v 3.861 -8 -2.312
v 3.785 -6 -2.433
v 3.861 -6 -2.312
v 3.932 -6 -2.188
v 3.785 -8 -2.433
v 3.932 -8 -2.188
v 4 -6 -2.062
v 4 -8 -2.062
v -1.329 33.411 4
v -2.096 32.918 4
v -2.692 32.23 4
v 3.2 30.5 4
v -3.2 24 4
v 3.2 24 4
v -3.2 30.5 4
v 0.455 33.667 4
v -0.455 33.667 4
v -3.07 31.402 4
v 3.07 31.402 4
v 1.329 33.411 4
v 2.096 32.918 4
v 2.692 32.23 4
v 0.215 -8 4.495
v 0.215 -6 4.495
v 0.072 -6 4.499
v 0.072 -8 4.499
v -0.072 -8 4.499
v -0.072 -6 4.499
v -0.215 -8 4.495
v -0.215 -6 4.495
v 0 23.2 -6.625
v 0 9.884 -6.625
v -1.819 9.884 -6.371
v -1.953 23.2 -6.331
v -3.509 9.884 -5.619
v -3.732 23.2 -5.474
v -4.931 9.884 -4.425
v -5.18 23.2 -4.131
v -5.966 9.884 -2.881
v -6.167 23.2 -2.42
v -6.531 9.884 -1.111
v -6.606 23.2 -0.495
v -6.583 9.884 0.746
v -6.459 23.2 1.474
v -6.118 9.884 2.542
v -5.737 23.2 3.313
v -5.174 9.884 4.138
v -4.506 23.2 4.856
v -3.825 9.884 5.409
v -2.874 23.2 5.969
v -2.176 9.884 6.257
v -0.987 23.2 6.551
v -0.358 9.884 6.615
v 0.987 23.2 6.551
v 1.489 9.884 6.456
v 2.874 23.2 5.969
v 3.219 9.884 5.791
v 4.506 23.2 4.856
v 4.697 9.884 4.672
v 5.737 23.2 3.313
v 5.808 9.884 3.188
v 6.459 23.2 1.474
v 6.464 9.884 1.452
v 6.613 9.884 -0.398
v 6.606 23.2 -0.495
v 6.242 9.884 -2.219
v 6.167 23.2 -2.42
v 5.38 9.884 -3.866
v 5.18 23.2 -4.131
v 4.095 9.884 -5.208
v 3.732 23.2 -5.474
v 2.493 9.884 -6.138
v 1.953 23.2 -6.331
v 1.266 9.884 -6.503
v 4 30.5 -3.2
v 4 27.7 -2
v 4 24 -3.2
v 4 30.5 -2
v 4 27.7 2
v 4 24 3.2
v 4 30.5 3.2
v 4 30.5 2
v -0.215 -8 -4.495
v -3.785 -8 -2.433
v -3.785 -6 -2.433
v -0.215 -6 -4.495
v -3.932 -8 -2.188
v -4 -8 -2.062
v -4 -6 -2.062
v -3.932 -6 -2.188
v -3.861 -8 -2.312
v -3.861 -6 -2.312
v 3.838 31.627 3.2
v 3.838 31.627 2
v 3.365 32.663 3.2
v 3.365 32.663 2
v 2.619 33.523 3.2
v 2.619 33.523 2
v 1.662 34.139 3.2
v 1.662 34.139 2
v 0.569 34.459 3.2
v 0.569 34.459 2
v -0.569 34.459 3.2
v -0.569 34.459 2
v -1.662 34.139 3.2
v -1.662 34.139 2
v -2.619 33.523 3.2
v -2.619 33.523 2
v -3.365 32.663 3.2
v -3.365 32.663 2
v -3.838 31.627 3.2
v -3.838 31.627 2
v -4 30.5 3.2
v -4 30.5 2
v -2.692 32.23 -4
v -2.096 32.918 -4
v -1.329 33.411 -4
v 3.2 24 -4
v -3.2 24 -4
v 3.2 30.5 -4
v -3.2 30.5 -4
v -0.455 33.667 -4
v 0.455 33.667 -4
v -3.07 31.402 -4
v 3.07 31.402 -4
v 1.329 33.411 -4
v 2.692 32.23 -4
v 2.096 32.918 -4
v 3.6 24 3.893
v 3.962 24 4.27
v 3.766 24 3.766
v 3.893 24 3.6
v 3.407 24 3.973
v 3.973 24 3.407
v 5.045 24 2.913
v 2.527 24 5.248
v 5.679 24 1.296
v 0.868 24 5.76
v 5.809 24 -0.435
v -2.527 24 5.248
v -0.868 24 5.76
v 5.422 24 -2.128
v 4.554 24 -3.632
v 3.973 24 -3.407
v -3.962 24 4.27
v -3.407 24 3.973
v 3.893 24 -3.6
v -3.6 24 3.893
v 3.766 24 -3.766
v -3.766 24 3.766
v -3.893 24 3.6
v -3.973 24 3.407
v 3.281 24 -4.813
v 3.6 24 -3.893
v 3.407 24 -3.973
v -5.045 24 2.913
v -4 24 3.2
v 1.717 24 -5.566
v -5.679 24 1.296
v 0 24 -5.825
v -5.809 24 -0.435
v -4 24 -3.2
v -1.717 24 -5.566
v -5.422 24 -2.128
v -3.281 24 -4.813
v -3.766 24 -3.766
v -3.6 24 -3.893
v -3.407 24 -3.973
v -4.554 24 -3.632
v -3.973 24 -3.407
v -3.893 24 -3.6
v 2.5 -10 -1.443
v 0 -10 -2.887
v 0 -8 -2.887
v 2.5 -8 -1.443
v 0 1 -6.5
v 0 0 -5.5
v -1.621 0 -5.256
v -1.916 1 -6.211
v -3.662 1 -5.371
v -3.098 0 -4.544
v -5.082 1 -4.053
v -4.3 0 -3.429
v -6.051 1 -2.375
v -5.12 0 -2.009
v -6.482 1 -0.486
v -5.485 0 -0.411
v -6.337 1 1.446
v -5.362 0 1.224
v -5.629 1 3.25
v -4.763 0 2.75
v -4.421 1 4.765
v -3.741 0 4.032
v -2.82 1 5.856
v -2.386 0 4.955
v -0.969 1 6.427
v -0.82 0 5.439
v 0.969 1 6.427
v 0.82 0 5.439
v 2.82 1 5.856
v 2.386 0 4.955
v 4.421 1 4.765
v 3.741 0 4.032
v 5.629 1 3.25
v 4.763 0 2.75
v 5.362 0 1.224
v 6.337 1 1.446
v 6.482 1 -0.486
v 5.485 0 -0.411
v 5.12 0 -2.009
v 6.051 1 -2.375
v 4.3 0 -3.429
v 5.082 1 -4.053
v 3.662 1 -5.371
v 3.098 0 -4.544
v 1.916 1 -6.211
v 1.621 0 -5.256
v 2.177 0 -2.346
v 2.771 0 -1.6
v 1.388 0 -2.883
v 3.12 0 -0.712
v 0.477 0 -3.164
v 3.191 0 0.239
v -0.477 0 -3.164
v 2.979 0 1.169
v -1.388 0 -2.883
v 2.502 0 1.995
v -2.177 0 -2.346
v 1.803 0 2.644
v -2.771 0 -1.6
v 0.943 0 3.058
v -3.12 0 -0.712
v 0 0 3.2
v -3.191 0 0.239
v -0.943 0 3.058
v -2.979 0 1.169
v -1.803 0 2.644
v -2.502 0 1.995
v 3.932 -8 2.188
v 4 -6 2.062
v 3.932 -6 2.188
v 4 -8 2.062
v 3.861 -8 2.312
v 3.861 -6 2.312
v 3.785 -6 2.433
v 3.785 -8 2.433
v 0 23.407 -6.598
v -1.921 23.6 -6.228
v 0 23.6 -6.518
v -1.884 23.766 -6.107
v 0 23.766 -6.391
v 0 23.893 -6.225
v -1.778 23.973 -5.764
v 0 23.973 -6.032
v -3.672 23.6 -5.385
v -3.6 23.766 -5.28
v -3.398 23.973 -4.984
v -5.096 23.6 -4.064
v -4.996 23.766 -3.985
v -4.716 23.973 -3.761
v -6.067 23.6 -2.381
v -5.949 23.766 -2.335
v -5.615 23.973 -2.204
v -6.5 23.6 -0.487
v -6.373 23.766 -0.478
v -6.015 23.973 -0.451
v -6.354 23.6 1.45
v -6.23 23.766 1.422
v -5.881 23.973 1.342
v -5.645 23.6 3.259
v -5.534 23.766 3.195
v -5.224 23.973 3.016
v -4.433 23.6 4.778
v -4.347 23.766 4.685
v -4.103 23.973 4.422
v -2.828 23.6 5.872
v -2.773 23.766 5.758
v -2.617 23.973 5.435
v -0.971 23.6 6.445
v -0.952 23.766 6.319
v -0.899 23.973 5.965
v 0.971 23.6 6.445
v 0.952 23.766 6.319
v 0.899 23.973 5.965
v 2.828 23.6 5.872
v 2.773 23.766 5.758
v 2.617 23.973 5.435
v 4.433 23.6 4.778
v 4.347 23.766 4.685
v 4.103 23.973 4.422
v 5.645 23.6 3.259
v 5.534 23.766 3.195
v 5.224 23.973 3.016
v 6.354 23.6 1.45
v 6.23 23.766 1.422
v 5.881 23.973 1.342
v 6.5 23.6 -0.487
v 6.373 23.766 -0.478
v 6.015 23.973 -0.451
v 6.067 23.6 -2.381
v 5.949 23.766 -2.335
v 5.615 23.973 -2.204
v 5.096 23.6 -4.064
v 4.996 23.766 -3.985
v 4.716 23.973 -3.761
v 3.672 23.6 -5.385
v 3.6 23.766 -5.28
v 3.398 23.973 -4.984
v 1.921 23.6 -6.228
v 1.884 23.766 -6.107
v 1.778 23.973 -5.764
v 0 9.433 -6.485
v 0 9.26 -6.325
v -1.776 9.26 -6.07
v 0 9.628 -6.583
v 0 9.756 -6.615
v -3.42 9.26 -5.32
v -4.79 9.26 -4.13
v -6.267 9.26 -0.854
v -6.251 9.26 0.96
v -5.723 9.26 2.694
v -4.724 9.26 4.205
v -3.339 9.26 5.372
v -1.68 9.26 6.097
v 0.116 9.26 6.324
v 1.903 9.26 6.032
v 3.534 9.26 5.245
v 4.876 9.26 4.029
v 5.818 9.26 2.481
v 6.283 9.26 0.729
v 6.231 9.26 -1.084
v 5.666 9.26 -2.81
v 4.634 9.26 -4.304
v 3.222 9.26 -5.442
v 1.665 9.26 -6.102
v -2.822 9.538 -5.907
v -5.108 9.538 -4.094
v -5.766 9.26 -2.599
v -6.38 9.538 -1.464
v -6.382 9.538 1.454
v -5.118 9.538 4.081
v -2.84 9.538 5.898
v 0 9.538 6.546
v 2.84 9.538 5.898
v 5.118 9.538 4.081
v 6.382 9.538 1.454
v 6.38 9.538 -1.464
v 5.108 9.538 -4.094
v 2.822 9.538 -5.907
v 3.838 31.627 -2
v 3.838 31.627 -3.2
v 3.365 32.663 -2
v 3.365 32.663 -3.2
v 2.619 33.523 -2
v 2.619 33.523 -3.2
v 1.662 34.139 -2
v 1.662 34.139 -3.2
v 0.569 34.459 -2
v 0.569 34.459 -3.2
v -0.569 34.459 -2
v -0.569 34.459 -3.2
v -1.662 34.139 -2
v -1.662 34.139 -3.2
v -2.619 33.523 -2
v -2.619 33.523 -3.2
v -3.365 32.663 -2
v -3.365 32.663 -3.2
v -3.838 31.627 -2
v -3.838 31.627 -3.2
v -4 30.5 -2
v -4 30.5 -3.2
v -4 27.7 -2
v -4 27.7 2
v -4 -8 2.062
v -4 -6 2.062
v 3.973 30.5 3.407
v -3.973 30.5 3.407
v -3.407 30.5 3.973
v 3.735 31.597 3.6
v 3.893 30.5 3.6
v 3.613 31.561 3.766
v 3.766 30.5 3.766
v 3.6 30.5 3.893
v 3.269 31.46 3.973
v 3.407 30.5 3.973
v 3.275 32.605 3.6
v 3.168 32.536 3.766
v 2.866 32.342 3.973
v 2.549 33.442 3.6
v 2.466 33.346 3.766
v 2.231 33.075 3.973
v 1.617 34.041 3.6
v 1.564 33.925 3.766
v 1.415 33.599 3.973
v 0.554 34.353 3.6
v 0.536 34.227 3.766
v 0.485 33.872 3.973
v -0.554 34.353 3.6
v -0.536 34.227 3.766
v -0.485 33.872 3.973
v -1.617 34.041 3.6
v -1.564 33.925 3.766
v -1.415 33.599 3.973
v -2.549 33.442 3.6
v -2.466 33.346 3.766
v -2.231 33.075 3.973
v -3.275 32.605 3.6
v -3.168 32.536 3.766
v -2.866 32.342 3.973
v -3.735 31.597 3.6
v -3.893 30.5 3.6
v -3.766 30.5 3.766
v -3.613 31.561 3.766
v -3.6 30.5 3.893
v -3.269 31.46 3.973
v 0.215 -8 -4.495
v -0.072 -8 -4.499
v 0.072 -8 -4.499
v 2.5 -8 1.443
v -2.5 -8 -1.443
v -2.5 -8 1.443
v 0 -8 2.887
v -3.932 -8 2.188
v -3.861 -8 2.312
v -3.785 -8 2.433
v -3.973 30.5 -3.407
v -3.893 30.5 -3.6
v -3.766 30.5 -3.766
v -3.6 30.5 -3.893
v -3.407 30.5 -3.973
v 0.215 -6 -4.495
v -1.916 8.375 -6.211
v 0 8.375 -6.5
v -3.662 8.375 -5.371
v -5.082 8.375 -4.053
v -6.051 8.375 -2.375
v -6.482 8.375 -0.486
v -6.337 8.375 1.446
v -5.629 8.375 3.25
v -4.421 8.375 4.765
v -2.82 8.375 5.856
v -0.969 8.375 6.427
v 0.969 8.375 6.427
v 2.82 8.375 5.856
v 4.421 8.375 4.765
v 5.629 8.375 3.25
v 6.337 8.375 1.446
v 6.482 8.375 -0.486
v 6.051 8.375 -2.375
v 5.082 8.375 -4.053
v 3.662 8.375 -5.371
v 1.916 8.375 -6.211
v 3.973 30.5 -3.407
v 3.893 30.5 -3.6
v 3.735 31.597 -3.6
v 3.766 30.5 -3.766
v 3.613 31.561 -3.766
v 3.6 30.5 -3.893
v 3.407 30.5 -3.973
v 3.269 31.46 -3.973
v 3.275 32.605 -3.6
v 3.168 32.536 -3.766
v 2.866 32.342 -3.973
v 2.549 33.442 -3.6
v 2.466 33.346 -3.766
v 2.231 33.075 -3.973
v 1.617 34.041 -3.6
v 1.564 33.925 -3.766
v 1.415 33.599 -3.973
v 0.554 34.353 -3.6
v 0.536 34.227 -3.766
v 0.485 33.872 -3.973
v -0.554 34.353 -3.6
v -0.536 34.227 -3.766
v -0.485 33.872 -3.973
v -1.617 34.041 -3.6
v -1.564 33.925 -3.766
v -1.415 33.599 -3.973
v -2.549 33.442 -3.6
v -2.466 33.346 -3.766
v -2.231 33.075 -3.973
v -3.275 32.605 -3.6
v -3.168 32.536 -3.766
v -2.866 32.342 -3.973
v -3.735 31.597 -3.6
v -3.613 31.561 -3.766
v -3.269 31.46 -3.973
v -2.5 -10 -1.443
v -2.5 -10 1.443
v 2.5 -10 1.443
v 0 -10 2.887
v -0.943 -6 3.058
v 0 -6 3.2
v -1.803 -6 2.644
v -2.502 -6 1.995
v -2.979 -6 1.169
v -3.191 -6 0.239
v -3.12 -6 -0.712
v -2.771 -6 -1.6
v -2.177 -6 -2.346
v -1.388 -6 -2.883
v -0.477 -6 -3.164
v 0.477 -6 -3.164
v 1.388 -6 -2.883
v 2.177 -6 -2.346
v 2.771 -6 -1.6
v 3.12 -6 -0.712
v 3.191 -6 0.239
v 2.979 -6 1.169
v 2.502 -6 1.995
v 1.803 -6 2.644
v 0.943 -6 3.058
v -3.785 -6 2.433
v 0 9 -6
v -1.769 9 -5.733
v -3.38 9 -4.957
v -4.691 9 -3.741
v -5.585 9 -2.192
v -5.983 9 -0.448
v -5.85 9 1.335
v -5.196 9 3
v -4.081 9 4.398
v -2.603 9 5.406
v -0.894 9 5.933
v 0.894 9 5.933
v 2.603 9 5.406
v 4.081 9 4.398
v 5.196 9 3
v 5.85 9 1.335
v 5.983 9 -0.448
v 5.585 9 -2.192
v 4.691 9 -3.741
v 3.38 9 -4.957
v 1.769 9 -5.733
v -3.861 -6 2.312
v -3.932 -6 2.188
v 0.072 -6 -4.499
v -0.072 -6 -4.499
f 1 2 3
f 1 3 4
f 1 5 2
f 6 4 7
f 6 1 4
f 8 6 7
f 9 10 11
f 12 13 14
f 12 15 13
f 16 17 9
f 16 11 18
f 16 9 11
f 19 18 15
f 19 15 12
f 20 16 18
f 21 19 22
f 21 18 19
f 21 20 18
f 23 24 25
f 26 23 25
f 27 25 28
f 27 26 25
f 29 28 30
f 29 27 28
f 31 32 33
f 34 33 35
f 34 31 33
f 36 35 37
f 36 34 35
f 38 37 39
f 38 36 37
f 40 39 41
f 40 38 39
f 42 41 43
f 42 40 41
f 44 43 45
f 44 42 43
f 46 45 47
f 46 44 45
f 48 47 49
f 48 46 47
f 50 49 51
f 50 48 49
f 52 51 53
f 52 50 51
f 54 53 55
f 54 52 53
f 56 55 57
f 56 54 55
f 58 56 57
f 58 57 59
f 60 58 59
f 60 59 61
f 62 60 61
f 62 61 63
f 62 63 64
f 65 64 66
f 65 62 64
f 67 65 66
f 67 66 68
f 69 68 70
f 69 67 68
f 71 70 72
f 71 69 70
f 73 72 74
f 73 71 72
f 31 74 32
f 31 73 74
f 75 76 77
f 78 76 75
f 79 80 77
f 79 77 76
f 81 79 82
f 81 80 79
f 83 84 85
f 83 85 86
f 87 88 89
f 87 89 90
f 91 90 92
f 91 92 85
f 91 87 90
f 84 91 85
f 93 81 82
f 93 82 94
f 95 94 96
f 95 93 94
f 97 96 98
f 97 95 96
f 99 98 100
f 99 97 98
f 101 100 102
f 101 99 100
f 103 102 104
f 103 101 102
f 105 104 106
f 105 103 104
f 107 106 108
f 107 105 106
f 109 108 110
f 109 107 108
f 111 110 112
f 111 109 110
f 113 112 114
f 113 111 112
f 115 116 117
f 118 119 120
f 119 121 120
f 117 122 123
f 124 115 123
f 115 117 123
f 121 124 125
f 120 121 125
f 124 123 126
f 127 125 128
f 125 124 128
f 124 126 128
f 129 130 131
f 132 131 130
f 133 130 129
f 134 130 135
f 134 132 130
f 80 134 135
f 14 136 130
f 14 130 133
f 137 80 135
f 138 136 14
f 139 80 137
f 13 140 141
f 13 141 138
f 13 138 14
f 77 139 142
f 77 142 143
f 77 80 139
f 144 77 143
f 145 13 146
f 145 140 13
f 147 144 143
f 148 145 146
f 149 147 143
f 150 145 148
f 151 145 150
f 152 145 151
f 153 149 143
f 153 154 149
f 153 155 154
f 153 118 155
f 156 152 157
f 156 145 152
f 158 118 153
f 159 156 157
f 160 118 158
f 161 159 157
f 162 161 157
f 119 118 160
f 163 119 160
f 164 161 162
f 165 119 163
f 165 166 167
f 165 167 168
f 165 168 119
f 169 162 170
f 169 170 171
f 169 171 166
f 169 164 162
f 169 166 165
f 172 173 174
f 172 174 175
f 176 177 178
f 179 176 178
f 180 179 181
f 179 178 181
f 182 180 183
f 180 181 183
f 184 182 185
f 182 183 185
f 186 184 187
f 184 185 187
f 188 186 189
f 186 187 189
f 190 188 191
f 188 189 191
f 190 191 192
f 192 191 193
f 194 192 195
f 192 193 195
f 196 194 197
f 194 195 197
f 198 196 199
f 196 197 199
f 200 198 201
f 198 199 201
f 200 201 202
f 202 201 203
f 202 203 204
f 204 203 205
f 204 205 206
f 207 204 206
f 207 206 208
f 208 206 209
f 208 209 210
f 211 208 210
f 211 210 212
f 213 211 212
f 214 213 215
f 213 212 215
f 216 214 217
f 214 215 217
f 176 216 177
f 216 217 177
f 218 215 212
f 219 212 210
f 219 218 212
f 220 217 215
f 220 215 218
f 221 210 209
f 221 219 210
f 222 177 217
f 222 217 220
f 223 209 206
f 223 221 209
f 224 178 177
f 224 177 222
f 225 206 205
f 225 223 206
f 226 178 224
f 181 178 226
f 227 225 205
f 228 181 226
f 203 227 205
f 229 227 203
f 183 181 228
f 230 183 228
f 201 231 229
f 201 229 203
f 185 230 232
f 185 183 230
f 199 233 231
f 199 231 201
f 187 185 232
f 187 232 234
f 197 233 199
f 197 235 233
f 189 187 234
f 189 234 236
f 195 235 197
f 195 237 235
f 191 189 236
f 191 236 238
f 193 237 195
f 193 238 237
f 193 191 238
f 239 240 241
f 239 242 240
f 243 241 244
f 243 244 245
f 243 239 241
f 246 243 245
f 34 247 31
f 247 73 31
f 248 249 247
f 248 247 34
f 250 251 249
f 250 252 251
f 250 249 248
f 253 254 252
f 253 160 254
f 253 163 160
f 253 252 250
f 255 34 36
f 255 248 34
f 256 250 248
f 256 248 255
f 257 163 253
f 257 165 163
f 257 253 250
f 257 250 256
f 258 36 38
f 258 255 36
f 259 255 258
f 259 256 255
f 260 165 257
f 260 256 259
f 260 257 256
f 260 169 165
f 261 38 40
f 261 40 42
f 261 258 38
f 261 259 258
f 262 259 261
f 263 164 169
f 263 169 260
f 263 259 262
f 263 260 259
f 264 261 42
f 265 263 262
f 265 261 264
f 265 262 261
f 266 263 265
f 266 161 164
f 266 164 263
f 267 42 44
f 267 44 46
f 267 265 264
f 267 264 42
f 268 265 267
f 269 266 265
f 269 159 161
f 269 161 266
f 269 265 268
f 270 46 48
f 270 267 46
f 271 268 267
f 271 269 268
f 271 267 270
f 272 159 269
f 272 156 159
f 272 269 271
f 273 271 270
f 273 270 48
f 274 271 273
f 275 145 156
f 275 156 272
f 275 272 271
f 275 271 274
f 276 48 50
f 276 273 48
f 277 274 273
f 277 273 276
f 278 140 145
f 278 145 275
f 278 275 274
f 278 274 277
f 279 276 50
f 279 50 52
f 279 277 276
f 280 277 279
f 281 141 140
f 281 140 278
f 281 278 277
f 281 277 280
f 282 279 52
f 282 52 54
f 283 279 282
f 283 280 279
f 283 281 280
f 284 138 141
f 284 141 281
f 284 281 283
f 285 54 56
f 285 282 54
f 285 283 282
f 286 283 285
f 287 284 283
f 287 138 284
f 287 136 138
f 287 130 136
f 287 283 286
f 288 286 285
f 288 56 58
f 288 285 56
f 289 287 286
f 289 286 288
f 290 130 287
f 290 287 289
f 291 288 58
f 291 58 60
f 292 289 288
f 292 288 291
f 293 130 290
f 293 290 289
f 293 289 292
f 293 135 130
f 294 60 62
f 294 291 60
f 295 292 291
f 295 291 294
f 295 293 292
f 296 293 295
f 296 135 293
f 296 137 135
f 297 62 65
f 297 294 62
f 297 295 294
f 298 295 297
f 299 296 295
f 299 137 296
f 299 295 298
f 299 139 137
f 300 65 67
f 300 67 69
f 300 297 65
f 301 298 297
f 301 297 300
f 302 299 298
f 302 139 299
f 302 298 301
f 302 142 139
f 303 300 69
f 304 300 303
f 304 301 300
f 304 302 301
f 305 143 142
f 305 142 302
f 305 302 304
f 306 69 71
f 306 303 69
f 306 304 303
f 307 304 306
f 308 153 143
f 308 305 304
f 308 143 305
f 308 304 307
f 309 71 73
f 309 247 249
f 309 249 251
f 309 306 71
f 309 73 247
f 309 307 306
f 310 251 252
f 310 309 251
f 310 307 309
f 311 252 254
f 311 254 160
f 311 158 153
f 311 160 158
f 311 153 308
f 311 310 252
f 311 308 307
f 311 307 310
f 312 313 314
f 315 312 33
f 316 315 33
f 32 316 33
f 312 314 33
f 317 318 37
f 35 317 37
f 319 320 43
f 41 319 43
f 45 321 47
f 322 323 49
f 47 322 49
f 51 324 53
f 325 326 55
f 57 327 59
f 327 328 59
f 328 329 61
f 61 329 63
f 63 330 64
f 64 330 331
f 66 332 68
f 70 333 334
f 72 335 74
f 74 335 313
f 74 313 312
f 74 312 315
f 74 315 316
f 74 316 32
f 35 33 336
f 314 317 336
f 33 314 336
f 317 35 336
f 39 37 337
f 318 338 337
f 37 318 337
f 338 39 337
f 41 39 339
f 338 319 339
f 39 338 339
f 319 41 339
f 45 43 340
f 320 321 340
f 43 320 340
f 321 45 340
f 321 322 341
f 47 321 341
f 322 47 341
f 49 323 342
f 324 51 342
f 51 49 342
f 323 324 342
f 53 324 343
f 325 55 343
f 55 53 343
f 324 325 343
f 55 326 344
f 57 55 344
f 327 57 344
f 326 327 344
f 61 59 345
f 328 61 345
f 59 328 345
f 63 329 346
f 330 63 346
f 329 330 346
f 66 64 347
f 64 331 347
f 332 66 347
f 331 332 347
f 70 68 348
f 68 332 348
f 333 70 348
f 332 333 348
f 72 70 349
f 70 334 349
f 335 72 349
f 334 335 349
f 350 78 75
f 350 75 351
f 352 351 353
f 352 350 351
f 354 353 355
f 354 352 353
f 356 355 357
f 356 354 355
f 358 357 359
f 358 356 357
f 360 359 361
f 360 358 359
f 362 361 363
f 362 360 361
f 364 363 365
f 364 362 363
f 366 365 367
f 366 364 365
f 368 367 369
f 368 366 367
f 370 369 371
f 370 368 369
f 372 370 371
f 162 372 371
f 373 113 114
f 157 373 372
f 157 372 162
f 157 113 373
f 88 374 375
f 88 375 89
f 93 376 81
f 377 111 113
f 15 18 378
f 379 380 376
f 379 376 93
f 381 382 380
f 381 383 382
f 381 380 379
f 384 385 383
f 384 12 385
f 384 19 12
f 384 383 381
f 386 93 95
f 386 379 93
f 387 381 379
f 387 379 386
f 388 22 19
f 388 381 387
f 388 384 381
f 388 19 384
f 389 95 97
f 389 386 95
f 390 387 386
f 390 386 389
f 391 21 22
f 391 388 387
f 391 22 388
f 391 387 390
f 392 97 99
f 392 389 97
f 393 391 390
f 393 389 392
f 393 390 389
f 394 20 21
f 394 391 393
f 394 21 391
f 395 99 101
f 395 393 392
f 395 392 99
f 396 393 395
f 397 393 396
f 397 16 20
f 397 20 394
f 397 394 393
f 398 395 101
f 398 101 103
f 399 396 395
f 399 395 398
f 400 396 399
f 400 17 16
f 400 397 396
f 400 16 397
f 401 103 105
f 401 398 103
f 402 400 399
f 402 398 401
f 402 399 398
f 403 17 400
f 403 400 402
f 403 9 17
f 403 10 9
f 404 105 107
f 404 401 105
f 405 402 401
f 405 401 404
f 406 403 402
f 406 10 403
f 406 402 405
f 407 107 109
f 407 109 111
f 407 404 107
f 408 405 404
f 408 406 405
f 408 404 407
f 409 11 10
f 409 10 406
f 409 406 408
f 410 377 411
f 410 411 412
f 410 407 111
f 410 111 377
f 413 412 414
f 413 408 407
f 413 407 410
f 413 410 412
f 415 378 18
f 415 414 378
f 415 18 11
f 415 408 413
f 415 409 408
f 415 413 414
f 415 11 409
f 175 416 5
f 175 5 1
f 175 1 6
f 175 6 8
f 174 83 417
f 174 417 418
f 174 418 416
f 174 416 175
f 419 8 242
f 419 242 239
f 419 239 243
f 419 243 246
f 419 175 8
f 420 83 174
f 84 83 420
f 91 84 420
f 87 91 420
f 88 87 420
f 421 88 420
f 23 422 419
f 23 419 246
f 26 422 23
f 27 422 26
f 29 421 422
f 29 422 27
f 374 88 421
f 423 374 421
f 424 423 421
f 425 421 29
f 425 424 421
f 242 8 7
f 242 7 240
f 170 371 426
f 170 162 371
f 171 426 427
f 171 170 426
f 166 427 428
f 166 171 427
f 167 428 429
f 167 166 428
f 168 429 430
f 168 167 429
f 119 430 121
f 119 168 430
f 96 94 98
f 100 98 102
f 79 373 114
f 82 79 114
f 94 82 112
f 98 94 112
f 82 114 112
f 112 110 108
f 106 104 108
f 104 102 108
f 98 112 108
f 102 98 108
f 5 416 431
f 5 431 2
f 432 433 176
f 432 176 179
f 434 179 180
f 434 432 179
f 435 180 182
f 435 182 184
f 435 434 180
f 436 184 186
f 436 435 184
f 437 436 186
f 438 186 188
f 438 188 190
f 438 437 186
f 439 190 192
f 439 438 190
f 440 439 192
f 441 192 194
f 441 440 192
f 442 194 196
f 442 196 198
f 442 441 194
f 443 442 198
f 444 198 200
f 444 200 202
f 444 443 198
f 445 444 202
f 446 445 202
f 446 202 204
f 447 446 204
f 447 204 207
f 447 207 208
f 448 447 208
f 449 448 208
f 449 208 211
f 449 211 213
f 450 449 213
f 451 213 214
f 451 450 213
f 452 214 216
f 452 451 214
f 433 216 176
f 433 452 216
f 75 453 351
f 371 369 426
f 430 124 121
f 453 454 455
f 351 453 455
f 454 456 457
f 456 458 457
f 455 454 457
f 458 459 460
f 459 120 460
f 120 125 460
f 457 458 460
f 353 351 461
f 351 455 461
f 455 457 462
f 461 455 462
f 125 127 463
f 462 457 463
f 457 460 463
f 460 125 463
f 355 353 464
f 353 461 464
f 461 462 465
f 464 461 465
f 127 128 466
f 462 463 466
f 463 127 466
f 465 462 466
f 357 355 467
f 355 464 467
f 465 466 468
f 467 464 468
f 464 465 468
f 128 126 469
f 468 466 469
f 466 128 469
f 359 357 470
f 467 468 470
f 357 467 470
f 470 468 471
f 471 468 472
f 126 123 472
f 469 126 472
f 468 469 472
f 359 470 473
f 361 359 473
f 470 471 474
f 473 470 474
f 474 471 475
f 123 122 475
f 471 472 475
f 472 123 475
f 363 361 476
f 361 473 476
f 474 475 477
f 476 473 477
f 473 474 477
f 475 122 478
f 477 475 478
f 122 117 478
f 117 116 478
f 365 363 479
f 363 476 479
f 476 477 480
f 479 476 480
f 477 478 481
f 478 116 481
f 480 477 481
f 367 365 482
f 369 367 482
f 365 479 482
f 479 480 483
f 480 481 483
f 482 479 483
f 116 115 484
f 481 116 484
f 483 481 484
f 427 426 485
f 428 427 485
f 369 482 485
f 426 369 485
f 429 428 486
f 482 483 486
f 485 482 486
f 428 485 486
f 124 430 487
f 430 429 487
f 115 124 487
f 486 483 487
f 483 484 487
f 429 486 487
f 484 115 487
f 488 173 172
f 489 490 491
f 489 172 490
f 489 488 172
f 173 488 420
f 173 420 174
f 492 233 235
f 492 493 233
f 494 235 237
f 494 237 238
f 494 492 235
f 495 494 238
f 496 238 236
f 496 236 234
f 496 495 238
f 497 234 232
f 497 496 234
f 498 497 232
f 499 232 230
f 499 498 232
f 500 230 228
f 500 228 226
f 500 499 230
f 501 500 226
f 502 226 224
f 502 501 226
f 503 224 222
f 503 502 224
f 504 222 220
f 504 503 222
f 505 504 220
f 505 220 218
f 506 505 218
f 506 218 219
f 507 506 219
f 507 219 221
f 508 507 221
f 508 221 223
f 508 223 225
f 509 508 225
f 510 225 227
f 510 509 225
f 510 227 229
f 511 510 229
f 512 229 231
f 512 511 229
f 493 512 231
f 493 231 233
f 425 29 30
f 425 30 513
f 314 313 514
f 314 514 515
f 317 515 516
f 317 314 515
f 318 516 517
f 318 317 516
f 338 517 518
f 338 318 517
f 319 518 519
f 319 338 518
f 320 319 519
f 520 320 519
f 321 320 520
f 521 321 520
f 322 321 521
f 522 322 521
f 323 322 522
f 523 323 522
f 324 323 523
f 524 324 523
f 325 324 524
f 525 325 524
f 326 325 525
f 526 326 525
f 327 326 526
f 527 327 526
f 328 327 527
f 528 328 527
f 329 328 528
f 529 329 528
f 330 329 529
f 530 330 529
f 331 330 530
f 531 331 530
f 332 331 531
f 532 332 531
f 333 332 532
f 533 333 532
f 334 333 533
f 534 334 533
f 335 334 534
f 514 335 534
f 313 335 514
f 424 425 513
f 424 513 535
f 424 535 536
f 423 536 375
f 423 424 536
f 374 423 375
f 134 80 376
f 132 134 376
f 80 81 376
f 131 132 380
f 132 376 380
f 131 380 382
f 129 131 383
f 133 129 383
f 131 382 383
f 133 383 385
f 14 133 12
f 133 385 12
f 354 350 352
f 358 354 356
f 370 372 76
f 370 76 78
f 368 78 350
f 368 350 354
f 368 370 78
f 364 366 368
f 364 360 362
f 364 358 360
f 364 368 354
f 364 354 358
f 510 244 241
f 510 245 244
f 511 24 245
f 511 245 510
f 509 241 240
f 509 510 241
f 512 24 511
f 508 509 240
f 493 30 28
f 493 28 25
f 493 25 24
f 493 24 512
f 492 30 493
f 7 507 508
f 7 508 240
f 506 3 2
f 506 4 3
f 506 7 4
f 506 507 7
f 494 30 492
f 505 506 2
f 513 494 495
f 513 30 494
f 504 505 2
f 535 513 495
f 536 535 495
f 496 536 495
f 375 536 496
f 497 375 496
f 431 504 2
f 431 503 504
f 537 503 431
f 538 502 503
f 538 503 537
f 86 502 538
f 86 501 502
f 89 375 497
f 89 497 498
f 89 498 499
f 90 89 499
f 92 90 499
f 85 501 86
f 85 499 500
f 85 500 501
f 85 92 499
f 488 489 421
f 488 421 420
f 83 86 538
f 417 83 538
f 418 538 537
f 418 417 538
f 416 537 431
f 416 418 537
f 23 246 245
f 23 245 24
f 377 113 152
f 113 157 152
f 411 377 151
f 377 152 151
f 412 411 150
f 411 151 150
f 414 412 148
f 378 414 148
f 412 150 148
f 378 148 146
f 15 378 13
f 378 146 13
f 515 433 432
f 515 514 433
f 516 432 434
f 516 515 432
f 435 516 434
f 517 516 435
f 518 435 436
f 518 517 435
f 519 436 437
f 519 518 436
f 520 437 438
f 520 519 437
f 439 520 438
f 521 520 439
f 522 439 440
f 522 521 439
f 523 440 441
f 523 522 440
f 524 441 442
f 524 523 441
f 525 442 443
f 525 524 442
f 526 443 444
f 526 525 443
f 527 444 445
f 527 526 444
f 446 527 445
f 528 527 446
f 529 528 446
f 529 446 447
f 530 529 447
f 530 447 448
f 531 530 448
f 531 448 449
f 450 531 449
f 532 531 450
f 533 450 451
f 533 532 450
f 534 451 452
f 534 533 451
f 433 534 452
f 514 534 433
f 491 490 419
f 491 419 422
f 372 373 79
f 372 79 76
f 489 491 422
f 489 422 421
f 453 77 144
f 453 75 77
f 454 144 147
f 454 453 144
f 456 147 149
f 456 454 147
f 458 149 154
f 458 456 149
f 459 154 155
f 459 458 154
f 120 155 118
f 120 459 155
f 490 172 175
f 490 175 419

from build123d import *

# Parameters (mm, degrees)
FILLET_ROUND_R          = 0.8
CHAMF_PLASTIC_BASE_SIZE = 1
SKETCH3_OUTSIDE_W       = 23.904
SKETCH3_OUTSIDE_H       = 23.904
CUT_8MM_HEX_DEPTH       = 3
SKETCH4_OUTSIDE_W       = 23.904
SKETCH4_OUTSIDE_H       = 23.904
CUT_5MM_HEX_DEPTH       = 2
BOSS_PIVOT_DEPTH        = 4
FILLET_PIVOT_R          = 0.8
CUT_EXTRUDE1_DEPTH      = 36.749562971
CUT_EXTRUDE1_DEPTH_BACK = 36.749562971
SKETCH6_W               = 4
SKETCH6_H               = 6.8
SKETCH7_R               = 1.3
CUT_EXTRUDE2_DEPTH      = 5


with BuildPart() as part:
    # Sketch1 → revolve body (revolve)
    with BuildSketch(Plane.XY, mode=Mode.PRIVATE) as revolve_body_sk:
        Polygon((6.5, 0), (6.5, 8.375), (6, 9), (6.625, 9.5), (6.625, 24), (0, 24), (0, 0), align=None)
    revolve(revolve_body_sk.sketch.rotate(Axis((0, 0, 0), (0, 1, 0)), 90), axis=Axis((0, 0, 0), (0, 1, 0)))

    # fillet round
    fillet_round_edges = [part.edges().sort_by_distance(p)[0] for p in [
        (0, 9.5, 6.625),
        (0, 24, 6.625),
    ]]
    fillet(fillet_round_edges, radius=FILLET_ROUND_R)

    # chamf plastic base
    chamf_plastic_base_edges = [part.edges().sort_by_distance(p)[0] for p in [
        (0, 0, 6.5),
    ]]
    chamfer(chamf_plastic_base_edges, length=CHAMF_PLASTIC_BASE_SIZE)

    # Sketch2 → revolve threaded body (revolve)
    with BuildSketch(Plane.XY, mode=Mode.PRIVATE) as revolve_threaded_body_sk:
        Polygon((3.2, 0), (3.2, -6), (4.5, -6), (4.5, -8), (3.25, -8), (3.25, -10), (1.3, -10), (1.3, -15), (0, -15), (0, 0), align=None)
    revolve(revolve_threaded_body_sk.sketch.rotate(Axis((0, 0, 0), (0, -1, 0)), 90), axis=Axis((0, 0, 0), (0, -1, 0)))

    # Sketch3 outside → cut 8mm hex (cut)
    with BuildSketch(Plane.XZ.offset(8)):
        Rectangle(SKETCH3_OUTSIDE_W, SKETCH3_OUTSIDE_H)
        Polygon((0, 4.618802154), (-4, 2.309401077), (-4, -2.309401077), (0, -4.618802154), (4, -2.309401077), (4, 2.309401077), align=None, mode=Mode.SUBTRACT)
    extrude(amount=-CUT_8MM_HEX_DEPTH, mode=Mode.SUBTRACT)

    # Sketch4 outside → cut 5mm hex (cut)
    with BuildSketch(Plane.XZ.offset(10)):
        Rectangle(SKETCH4_OUTSIDE_W, SKETCH4_OUTSIDE_H)
        Polygon((0, 2.886751346), (-2.5, 1.443375673), (-2.5, -1.443375673), (0, -2.886751346), (2.5, -1.443375673), (2.5, 1.443375673), align=None, mode=Mode.SUBTRACT)
    extrude(amount=-CUT_5MM_HEX_DEPTH, mode=Mode.SUBTRACT)

    # Sketch5 → boss pivot (add, symmetric)
    with BuildSketch(Plane.XY):
        with BuildLine():
            Line((-4, 24), (4, 24))
            Line((4, 24), (4, 30.5))
            ThreePointArc((4, 30.5), (0, 34.5), (-4, 30.5))
            Line((-4, 30.5), (-4, 24))
        make_face()
    extrude(amount=BOSS_PIVOT_DEPTH, both=True)

    # fillet pivot
    fillet_pivot_edges = [part.edges().sort_by_distance(p)[0] for p in [
        (-4, 27.25, -4),
        (4, 27.25, -4),
        (0, 34.5, -4),
        (-4, 27.25, 4),
        (4, 27.25, 4),
        (0, 34.5, 4),
    ]]
    fillet(fillet_pivot_edges, radius=FILLET_PIVOT_R)

    # Sketch6 → Cut-Extrude1 (cut, two sides: drawn at the far end of the back side and taken through both)
    with BuildSketch(Plane(origin=(0, 0, 0), x_dir=(0, 0, -1), z_dir=(1, 0, 0)).offset(-CUT_EXTRUDE1_DEPTH_BACK)):
        with Locations((0, 31.1)):
            Rectangle(SKETCH6_W, SKETCH6_H)
    extrude(amount=CUT_EXTRUDE1_DEPTH + CUT_EXTRUDE1_DEPTH_BACK, mode=Mode.SUBTRACT)

    # Sketch7 → Cut-Extrude2 (cut)
    with BuildSketch(Plane.XZ.offset(15)):
        Circle(SKETCH7_R)
    extrude(amount=-CUT_EXTRUDE2_DEPTH, mode=Mode.SUBTRACT)


solid = part.part
